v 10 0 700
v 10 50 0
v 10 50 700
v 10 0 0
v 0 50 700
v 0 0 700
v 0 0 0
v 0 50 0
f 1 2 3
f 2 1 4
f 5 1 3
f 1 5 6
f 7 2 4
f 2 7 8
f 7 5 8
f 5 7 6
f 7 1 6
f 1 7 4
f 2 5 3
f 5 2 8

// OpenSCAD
difference() {
  cube([10, 350, 700]);
  translate([0, 50, 0]) cube([10, 350, 700]);
  translate([0, 100, 0]) cube([10, 350, 700]);
  translate([0, 150, 0]) cube([10, 350, 700]);
  translate([0, 200, 0]) cube([10, 350, 700]);
  translate([0, 250, 0]) cube([10, 350, 700]);
  translate([0, 300, 0]) cube([10, 350, 700]);
  translate([0, 350, 0]) cube([10, 350, 700]);
}
